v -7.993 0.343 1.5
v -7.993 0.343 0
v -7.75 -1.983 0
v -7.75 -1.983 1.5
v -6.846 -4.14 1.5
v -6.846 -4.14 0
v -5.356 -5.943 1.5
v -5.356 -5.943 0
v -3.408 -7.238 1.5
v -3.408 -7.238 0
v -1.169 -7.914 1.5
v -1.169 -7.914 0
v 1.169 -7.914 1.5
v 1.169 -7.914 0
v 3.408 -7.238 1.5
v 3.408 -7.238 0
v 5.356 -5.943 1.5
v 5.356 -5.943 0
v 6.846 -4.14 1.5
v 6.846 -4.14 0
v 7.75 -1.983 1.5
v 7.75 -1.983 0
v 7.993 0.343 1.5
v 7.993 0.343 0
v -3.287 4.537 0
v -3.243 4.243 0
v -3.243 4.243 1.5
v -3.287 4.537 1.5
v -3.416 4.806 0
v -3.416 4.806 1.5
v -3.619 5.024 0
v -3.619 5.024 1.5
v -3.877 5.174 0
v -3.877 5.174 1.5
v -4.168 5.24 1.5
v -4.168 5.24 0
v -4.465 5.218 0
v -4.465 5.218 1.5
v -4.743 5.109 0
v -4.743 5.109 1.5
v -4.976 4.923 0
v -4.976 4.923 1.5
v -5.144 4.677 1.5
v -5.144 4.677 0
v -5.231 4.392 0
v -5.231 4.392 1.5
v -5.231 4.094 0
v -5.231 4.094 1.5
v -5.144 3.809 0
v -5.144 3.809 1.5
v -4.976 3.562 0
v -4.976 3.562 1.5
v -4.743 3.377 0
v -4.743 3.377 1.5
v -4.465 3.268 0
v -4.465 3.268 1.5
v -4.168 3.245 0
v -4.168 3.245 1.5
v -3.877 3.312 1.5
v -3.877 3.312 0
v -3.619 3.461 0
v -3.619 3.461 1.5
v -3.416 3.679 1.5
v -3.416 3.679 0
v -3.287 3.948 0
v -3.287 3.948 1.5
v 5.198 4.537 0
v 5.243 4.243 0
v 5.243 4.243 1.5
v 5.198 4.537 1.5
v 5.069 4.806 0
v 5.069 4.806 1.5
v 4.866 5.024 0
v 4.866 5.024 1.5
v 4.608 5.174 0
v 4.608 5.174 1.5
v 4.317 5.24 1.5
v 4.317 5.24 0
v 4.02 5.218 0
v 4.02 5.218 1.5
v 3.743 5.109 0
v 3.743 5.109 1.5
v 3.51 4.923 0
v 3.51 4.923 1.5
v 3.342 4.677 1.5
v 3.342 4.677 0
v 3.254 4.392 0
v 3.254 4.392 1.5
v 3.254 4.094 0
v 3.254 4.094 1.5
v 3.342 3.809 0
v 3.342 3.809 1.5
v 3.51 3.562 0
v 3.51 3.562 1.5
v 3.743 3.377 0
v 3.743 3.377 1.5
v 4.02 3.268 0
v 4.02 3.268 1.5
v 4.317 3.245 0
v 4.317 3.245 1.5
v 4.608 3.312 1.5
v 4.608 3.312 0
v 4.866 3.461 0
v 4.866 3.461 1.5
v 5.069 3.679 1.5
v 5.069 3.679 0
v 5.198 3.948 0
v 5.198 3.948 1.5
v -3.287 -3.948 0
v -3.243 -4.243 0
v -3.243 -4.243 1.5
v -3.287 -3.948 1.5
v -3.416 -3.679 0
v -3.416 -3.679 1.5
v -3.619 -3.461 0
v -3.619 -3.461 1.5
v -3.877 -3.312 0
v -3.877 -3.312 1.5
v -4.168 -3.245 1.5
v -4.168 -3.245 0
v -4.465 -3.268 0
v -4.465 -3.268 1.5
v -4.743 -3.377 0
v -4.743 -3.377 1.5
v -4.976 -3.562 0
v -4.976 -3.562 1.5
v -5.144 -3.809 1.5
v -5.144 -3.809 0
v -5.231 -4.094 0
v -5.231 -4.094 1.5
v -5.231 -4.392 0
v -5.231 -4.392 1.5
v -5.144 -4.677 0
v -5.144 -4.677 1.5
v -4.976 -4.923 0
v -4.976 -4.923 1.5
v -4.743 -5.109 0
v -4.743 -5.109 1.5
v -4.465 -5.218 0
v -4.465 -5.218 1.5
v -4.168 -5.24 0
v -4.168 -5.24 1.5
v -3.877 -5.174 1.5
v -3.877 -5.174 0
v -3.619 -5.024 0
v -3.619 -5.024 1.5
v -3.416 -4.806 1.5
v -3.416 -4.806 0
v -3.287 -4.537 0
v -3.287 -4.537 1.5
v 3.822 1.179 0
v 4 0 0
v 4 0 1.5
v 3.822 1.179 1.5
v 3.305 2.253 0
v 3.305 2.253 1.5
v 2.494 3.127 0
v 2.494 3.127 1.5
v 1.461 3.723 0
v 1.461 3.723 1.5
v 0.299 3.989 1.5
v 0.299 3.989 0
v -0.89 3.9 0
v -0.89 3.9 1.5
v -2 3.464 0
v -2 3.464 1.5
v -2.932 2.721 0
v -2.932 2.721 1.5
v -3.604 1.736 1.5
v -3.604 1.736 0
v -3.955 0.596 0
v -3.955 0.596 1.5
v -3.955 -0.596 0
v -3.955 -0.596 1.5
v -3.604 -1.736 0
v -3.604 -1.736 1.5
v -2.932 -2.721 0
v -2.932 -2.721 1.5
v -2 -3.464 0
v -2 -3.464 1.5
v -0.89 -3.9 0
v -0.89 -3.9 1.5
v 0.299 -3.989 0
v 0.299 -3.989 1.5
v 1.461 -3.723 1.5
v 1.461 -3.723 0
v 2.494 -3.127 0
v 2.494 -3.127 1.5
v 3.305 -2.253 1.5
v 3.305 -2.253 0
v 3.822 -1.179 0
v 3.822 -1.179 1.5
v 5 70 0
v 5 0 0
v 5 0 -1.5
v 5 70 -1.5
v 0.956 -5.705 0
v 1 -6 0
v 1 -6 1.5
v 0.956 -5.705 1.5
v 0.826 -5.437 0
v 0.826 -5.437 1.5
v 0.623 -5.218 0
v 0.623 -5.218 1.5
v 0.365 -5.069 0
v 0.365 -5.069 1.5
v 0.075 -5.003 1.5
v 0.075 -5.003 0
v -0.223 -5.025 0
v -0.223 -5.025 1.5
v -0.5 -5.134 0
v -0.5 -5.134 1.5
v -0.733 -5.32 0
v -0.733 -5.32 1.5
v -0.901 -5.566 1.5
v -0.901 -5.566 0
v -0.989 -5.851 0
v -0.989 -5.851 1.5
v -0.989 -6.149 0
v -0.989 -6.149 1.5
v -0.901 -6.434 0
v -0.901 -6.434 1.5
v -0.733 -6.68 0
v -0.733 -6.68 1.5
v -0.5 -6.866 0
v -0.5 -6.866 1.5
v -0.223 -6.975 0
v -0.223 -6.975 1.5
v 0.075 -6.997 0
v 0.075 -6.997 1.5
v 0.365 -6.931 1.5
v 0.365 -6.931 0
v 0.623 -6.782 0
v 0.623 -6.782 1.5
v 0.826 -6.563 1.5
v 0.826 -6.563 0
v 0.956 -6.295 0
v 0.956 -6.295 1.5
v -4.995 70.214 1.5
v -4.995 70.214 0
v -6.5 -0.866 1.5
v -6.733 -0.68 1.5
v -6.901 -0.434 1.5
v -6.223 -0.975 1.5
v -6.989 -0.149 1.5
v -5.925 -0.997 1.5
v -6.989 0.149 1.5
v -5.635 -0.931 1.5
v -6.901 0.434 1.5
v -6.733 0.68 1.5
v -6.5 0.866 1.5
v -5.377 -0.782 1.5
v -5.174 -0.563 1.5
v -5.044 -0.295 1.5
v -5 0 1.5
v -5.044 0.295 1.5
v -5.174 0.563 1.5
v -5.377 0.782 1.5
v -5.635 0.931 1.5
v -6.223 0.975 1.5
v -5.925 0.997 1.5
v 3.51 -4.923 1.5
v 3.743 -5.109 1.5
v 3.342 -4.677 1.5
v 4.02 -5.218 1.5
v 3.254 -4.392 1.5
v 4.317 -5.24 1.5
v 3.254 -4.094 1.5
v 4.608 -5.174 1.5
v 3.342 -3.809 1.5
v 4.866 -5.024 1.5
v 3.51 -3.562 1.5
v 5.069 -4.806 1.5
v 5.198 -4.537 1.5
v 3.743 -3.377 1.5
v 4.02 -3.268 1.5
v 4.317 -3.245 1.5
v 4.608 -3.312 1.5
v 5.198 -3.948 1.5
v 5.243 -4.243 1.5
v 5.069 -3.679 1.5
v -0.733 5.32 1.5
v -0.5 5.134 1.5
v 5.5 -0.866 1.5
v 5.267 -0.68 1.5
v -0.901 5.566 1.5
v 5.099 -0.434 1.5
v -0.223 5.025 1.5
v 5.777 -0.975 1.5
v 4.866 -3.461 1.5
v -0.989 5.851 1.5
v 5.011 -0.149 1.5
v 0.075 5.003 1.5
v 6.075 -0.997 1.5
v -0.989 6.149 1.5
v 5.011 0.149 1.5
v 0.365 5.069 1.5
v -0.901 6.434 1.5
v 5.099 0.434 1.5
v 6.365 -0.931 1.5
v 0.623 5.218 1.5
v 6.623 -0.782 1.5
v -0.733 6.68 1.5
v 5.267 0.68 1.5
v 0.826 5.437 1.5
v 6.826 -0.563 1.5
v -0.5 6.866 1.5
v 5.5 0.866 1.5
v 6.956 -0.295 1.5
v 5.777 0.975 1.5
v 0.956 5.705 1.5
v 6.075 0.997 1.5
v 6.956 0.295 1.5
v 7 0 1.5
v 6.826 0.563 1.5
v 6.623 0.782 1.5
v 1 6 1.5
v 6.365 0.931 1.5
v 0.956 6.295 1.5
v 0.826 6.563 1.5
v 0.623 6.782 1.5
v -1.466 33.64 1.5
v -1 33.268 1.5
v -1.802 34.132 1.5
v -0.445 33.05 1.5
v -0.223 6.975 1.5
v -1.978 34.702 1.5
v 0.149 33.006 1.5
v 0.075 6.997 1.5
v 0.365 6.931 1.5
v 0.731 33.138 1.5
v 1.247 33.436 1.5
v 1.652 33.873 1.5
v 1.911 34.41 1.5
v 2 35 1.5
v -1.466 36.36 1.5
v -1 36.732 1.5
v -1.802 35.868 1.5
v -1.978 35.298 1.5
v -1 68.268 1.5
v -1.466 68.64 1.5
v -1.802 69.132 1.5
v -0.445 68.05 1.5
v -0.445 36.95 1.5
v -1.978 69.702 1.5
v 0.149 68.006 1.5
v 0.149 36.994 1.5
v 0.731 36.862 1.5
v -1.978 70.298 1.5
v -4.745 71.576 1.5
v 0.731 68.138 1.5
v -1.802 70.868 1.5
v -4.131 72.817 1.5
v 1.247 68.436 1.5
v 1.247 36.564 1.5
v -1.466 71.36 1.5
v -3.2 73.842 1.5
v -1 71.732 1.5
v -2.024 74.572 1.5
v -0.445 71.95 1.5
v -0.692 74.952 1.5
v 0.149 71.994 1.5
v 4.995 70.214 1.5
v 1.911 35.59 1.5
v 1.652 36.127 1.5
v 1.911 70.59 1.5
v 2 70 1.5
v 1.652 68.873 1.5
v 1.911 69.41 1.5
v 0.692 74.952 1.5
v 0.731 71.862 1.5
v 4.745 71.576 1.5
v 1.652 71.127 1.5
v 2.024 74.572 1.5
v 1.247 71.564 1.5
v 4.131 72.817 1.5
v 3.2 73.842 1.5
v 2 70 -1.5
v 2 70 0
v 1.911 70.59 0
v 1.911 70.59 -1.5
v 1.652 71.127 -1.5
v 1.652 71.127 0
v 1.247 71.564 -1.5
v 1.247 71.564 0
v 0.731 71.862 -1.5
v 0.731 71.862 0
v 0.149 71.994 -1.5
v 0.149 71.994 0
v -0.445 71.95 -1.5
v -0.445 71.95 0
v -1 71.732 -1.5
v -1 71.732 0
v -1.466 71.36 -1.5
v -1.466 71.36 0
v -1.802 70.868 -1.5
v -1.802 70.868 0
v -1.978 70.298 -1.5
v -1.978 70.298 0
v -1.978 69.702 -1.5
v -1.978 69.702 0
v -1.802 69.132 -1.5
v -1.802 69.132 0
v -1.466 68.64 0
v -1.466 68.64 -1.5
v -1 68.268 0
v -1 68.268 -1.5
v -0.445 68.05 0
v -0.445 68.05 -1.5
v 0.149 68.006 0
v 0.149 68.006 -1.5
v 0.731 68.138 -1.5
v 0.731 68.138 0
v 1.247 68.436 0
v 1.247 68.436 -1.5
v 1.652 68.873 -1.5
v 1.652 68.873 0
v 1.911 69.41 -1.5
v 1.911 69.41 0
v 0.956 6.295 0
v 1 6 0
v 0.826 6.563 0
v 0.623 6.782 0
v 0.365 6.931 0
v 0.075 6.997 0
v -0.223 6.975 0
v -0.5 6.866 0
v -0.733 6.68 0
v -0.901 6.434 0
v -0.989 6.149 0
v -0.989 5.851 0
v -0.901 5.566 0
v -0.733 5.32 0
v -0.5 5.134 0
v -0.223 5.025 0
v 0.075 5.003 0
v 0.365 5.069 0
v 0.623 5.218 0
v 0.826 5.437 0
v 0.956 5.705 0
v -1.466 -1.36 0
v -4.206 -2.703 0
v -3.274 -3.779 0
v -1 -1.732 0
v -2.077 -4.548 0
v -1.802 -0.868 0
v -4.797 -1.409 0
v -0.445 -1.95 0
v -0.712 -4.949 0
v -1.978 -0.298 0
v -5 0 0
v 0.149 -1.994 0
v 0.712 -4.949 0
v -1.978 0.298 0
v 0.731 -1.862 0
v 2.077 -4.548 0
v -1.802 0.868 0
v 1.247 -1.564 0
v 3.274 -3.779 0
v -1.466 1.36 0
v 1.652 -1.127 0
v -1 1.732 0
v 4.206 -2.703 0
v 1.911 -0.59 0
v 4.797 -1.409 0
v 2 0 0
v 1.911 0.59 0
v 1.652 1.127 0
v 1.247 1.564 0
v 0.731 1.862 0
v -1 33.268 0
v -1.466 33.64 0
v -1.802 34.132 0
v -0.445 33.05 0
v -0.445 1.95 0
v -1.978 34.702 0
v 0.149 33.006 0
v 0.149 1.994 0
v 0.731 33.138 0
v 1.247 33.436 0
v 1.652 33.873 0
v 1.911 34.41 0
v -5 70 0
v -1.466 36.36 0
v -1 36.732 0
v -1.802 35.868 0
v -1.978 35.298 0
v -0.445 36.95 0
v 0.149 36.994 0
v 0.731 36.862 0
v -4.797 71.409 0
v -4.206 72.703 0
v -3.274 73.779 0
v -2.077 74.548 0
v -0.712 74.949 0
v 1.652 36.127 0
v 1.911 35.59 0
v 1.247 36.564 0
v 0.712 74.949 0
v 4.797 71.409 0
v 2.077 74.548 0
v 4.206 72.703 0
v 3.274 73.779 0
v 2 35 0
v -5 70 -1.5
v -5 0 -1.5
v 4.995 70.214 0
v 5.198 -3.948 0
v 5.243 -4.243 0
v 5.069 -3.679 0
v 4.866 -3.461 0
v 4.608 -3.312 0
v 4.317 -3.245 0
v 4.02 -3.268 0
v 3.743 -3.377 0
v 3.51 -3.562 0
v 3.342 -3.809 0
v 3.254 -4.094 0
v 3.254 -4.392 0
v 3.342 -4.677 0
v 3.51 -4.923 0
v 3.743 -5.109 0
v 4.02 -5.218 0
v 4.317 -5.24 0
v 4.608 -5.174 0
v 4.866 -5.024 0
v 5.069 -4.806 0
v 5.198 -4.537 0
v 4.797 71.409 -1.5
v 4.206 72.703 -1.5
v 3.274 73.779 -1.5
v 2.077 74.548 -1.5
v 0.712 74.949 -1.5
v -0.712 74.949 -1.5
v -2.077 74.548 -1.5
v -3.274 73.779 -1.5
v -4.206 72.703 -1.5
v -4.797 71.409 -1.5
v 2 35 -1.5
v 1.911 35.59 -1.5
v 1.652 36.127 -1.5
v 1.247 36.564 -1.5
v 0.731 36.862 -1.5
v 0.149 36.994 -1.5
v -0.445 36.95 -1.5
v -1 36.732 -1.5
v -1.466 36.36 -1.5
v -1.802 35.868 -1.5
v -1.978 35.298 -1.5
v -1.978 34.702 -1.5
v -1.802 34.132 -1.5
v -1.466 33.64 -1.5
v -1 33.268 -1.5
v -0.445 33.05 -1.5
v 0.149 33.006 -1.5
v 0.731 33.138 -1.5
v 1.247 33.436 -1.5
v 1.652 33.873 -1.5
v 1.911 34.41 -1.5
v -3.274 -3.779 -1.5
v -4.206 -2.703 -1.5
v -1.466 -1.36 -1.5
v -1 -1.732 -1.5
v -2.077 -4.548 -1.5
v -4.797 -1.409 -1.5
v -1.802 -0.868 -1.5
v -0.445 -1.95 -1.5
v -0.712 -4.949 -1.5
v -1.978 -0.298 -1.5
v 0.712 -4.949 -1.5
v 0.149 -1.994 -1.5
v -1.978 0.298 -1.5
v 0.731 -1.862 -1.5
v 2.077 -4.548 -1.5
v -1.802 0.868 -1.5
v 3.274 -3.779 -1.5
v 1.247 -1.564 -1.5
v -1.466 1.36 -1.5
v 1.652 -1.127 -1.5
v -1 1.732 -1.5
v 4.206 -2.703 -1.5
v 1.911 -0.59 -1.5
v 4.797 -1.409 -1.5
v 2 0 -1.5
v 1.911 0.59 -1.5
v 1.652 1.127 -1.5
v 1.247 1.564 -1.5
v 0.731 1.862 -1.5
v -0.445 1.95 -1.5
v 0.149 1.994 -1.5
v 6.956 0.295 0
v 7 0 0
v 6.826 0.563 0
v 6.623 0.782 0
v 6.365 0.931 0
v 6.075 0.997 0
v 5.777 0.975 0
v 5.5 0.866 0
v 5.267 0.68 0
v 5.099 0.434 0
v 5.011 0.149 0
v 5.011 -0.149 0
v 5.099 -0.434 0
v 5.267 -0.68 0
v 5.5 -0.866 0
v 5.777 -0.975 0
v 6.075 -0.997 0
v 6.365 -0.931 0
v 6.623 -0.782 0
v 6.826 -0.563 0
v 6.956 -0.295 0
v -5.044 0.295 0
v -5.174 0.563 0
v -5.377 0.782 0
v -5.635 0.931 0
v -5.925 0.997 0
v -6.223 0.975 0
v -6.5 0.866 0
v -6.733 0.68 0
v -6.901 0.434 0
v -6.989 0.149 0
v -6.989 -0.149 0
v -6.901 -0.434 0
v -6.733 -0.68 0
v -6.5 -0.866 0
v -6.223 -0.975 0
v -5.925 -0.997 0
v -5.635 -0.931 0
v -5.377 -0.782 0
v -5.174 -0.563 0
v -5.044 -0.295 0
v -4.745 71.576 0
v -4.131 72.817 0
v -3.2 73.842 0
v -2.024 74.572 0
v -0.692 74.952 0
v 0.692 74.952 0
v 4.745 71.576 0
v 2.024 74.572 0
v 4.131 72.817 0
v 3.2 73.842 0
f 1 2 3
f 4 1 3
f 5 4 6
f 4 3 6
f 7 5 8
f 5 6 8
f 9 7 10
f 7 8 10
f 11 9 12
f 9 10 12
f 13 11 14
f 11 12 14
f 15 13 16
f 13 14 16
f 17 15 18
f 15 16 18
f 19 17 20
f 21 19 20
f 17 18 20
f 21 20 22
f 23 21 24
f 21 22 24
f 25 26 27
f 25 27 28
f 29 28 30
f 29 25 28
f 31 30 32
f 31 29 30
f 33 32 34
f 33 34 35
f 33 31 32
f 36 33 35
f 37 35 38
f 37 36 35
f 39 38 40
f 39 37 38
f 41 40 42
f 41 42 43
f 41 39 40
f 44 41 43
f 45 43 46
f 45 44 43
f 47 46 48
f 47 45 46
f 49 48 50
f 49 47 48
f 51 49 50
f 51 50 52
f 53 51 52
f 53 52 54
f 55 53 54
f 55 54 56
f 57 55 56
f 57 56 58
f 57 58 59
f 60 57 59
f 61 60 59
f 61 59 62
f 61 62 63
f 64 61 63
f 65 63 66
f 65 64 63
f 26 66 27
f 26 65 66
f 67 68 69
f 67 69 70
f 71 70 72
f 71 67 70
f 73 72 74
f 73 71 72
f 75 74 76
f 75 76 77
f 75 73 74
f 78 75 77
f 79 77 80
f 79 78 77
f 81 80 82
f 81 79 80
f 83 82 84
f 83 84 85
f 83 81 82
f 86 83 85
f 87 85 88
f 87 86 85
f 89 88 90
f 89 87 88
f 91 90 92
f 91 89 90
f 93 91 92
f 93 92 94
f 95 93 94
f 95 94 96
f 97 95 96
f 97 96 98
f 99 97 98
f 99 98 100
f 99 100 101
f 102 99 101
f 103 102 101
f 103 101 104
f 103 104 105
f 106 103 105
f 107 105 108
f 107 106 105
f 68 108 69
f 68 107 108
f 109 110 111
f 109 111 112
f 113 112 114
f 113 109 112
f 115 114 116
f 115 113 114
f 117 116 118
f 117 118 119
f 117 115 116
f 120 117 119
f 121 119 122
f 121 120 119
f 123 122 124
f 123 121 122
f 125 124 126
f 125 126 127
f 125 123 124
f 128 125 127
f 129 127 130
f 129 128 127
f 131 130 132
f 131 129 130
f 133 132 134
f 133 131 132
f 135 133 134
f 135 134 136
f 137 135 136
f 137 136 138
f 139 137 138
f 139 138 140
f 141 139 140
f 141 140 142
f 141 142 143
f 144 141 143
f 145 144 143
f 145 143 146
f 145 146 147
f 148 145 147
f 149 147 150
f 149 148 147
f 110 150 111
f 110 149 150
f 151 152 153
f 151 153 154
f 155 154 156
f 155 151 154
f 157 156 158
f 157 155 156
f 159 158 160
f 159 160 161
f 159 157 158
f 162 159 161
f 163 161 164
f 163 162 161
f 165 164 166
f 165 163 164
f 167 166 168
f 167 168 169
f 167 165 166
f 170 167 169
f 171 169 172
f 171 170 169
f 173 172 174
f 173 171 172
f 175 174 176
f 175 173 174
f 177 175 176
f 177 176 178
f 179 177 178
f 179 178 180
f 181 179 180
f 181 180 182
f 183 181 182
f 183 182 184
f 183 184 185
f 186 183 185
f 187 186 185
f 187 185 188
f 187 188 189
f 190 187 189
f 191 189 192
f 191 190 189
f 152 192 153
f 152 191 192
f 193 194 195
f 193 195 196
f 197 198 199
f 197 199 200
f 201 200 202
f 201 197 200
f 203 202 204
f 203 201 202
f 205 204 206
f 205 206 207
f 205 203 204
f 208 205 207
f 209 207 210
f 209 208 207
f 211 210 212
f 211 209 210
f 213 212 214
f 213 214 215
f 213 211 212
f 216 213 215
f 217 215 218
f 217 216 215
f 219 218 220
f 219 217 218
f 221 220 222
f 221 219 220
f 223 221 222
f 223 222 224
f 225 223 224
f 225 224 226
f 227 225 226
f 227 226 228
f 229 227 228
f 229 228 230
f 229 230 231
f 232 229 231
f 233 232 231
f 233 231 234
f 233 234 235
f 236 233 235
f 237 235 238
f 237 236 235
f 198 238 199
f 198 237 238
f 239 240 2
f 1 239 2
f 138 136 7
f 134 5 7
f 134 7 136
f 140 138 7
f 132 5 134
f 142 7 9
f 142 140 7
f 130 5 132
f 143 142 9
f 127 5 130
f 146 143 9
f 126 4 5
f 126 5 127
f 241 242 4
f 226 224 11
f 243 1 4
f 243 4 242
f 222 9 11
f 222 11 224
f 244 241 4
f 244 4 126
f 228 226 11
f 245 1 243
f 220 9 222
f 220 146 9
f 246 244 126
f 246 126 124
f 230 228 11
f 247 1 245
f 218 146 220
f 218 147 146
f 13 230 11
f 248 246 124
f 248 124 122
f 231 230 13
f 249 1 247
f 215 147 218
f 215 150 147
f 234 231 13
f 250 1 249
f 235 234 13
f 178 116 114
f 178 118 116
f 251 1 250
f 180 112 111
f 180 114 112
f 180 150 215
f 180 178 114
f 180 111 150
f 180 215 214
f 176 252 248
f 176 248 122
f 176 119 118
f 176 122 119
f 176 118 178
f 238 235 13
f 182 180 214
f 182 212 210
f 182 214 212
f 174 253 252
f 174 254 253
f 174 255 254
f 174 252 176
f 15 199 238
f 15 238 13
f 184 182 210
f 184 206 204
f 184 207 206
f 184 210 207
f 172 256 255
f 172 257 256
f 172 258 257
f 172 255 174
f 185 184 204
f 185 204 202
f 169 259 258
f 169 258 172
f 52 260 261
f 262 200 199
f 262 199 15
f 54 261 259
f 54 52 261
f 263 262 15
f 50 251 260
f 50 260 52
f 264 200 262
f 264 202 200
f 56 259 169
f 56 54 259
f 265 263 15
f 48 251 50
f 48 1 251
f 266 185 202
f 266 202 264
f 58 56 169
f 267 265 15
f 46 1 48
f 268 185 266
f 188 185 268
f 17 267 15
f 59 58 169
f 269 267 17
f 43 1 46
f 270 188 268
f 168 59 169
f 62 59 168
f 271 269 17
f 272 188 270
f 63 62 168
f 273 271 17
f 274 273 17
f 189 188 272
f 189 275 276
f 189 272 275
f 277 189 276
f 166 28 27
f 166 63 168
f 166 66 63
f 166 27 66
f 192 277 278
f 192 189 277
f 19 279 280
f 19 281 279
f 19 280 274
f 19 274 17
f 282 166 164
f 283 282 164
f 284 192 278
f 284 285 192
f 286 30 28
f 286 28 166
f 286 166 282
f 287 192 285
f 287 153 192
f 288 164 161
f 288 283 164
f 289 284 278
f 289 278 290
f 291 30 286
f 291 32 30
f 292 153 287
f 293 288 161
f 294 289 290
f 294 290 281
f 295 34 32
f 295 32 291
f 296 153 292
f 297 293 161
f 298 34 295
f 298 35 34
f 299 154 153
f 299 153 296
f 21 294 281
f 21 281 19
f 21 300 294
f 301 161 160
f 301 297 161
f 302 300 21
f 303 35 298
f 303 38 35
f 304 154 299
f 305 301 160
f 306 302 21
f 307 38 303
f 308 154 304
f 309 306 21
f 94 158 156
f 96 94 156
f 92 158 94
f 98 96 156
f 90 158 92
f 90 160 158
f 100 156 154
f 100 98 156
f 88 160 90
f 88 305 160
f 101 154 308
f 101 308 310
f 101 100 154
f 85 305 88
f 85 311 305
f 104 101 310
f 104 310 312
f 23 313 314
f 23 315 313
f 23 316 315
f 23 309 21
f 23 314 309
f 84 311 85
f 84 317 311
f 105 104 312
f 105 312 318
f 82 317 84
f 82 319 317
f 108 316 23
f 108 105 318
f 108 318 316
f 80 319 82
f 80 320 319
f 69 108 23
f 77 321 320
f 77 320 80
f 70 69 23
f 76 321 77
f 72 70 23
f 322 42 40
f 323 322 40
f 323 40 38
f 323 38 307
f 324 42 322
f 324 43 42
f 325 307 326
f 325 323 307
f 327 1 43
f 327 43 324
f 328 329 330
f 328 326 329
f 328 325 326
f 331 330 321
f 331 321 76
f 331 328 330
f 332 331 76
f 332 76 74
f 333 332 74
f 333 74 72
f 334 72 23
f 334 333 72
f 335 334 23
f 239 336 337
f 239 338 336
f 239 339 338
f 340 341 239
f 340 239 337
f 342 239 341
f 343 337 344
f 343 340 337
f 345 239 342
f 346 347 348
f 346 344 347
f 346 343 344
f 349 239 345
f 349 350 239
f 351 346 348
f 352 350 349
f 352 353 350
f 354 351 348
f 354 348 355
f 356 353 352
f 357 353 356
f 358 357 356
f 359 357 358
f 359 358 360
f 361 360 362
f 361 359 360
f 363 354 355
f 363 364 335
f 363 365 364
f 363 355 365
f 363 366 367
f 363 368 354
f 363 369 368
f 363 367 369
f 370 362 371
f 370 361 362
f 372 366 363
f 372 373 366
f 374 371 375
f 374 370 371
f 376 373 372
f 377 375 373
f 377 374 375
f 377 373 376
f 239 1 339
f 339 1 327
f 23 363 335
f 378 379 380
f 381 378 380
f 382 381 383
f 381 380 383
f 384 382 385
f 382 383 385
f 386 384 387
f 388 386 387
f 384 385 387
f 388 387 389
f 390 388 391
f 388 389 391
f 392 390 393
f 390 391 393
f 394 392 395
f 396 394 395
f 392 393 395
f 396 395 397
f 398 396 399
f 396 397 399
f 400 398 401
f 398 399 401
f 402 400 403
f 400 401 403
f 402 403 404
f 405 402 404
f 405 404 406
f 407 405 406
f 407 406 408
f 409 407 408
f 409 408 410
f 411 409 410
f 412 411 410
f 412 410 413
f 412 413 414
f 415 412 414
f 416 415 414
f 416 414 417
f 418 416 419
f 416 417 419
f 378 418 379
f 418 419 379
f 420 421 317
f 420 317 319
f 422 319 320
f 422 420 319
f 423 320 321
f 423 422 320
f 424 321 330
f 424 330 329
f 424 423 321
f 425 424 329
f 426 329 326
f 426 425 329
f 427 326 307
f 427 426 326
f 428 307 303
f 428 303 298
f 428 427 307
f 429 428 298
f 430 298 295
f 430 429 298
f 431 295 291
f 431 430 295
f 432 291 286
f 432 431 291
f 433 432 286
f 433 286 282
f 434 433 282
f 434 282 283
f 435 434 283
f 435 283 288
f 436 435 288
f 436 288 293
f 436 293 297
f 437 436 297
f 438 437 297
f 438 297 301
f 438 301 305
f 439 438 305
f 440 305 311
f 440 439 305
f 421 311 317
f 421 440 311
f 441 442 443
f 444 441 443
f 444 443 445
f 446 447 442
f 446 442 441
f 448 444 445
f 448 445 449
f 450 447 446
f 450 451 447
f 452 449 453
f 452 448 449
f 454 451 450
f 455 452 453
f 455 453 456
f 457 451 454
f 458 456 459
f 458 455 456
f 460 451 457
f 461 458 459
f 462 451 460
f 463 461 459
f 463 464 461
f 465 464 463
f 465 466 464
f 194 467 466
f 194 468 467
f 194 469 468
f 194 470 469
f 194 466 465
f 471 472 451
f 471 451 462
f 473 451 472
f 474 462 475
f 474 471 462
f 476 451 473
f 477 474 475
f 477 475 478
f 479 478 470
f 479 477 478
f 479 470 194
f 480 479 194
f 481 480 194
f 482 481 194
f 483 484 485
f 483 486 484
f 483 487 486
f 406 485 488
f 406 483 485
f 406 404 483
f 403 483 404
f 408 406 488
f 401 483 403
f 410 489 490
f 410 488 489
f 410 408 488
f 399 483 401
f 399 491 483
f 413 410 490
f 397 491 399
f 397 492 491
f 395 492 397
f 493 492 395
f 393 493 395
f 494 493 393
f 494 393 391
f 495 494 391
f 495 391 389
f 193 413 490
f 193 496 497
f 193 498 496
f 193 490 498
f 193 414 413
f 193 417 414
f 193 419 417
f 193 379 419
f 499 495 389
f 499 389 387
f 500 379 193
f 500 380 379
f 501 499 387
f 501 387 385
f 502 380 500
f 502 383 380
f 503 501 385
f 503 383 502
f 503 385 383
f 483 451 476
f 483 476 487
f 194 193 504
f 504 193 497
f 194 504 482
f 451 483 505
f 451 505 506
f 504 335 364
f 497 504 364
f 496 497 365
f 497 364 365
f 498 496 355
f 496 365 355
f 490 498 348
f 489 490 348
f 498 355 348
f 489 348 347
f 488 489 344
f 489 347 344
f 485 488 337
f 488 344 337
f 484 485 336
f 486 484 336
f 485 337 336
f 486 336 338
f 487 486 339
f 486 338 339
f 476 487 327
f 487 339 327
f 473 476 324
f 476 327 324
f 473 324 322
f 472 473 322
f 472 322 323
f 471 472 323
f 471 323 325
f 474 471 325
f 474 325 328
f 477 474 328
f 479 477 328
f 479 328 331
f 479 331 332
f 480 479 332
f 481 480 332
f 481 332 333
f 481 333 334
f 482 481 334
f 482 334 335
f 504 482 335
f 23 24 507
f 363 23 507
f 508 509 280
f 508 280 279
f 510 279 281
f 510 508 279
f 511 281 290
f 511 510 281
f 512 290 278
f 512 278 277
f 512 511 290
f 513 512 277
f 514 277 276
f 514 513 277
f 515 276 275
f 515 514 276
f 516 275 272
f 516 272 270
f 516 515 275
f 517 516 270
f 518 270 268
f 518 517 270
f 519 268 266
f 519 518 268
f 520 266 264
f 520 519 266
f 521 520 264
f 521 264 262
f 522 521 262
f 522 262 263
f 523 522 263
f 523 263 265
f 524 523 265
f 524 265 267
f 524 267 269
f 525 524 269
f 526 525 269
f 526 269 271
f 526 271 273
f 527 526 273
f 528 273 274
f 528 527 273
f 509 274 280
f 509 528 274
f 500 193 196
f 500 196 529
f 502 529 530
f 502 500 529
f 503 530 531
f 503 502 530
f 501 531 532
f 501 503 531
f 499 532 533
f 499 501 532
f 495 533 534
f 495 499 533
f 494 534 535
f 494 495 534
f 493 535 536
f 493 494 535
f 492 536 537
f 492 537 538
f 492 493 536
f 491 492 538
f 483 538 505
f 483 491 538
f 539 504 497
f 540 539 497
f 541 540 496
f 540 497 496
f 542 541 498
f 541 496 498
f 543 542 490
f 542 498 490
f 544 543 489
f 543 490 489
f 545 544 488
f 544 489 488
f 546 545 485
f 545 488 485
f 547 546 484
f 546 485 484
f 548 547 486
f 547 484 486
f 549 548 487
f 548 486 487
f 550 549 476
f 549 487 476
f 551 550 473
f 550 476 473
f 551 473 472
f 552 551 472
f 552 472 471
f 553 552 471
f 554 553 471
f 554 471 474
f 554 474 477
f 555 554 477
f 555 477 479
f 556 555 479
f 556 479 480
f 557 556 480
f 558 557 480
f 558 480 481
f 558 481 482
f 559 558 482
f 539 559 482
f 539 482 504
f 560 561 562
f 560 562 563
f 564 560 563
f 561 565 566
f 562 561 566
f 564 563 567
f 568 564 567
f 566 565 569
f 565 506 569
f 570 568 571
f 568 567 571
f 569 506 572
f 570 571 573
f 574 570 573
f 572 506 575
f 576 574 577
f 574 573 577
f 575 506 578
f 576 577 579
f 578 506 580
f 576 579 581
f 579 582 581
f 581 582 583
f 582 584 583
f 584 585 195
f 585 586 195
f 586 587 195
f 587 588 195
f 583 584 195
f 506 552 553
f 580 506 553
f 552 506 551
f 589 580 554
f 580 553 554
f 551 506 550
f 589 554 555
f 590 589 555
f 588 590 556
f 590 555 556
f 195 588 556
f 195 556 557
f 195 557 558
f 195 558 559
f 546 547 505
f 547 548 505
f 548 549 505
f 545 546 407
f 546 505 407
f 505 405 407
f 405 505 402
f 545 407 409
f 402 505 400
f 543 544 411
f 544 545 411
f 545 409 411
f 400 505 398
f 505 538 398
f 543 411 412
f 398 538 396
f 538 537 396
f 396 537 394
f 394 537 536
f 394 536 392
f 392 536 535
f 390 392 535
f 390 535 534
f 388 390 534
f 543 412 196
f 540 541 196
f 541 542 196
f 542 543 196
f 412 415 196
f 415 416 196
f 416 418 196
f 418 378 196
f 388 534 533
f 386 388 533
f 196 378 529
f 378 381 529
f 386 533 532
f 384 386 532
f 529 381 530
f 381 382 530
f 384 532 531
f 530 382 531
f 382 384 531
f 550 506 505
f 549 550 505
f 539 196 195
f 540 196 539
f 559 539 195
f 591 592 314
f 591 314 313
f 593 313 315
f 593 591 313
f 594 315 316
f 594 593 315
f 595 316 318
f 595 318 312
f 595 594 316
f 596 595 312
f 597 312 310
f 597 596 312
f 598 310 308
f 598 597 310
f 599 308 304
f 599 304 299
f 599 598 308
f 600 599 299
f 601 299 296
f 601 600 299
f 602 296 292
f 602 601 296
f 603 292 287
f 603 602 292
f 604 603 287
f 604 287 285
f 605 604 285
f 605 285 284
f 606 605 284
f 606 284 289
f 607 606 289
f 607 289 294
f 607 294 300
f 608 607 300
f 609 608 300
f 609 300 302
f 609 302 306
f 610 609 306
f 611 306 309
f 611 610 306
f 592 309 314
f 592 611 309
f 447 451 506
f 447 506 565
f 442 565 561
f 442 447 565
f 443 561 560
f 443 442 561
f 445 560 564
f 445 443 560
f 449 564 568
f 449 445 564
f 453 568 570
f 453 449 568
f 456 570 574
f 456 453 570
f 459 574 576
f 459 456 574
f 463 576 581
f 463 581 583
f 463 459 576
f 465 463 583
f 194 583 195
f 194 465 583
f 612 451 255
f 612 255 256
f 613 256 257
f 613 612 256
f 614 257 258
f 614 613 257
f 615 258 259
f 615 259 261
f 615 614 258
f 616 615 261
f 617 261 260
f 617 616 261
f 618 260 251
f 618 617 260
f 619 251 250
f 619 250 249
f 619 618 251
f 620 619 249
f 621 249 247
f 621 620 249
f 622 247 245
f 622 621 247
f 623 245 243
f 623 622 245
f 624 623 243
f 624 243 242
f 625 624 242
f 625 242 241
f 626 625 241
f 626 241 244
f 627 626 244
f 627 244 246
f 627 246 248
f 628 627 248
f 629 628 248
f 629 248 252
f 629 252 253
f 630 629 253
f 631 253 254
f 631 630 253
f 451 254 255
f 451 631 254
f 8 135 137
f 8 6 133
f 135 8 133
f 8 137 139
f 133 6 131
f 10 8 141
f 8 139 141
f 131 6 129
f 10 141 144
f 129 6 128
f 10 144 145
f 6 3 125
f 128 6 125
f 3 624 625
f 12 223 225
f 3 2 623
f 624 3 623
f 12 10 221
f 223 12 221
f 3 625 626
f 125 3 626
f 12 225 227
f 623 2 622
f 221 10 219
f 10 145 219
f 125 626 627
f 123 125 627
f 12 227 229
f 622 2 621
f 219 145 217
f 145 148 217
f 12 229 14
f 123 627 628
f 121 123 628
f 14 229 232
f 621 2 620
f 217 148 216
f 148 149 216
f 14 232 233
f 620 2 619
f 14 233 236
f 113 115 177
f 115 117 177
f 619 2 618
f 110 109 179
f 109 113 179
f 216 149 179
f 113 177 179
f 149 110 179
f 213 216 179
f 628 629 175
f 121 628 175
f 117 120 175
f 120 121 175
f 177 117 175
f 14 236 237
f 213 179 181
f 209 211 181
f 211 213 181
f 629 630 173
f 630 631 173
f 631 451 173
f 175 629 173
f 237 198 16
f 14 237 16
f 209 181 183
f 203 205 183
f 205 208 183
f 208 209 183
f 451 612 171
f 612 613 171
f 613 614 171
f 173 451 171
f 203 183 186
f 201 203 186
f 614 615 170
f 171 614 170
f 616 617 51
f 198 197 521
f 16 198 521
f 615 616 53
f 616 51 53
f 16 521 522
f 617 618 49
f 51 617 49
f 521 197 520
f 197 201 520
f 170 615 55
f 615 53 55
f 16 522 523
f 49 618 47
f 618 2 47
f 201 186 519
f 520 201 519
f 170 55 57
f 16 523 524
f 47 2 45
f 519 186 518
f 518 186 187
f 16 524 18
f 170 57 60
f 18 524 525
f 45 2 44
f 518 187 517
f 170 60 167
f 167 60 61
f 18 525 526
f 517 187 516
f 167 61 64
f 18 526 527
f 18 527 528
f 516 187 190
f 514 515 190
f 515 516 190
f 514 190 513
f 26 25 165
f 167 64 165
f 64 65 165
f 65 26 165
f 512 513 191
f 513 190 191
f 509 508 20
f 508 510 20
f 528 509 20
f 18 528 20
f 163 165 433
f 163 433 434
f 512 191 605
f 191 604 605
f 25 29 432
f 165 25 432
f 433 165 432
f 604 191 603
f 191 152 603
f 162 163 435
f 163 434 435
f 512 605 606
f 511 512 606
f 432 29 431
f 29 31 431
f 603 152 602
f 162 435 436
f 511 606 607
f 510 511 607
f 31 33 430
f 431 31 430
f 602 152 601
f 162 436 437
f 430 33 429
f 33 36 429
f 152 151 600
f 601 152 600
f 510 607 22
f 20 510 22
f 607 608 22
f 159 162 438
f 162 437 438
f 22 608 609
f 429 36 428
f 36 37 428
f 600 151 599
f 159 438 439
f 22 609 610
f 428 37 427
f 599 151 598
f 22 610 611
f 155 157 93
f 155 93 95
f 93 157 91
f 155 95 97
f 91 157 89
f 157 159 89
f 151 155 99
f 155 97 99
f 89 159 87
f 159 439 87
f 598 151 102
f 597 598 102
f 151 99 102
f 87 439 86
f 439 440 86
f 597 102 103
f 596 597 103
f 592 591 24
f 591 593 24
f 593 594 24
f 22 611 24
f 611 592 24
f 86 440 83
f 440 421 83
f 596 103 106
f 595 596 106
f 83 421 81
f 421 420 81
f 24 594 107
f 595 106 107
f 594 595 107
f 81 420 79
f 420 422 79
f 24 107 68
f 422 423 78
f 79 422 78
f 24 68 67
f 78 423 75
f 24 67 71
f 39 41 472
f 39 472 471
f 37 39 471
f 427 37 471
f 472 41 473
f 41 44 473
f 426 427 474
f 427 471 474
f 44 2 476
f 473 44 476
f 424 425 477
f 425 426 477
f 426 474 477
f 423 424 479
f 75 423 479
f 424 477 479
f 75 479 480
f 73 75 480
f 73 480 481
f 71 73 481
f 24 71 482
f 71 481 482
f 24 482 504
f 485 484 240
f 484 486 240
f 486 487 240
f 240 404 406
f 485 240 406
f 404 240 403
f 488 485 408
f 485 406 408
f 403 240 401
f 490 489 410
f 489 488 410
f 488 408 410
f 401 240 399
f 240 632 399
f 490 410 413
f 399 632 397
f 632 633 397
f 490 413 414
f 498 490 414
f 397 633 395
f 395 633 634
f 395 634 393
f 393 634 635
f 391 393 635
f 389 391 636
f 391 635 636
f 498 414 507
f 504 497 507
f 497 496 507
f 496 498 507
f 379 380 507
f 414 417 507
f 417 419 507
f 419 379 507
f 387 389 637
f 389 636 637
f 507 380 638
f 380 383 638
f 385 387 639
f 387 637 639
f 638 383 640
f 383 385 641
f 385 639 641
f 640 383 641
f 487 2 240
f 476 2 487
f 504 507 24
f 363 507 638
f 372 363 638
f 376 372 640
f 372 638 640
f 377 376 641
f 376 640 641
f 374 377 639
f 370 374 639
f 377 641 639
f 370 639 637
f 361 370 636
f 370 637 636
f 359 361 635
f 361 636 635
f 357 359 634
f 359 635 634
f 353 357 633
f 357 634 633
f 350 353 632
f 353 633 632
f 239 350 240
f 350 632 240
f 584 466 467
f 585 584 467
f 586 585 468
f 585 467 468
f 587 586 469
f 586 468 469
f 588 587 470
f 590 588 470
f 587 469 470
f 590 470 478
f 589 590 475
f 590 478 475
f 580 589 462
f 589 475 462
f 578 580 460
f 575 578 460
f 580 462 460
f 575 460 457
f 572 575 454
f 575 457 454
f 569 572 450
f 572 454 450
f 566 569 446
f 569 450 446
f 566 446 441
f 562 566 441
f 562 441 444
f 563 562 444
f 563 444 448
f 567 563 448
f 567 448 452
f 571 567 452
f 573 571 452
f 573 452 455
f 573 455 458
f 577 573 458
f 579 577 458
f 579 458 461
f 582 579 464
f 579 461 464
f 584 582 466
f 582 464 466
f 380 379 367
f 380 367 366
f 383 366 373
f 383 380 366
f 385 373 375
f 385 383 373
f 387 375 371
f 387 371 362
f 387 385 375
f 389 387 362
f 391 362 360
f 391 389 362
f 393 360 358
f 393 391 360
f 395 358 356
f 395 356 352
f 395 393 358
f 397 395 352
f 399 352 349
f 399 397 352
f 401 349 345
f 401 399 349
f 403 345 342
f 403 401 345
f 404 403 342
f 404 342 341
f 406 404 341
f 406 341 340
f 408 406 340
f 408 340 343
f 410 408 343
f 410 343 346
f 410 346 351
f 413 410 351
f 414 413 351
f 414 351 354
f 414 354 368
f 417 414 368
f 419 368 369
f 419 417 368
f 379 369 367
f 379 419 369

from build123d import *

# Parameters (mm, degrees)
F0_R     = 1
F0_R_2   = 4
F0_R_3   = 2
F1_DEPTH = 1.5
F2_R     = 2
F3_DEPTH = 1.5
F4_R     = 2
F5_DEPTH = 3.001


with BuildPart() as f1:
    # F0 (on Top) → F1 (new body)
    with BuildSketch(Plane.XY):
        with BuildLine():
            Line((-4.995406, 70.214286), (-7.99265, 0.342857))
            ThreePointArc((-7.99265, 0.342857), (0, -8), (7.99265, 0.342857))
            Line((7.99265, 0.342857), (4.995406, 70.214286))
            ThreePointArc((4.995406, 70.214286), (0, 75), (-4.995406, 70.214286))
        make_face()
        with Locations((-4.242641, -4.242641)):
            Circle(F0_R, mode=Mode.SUBTRACT)
        with Locations((-6, 0)):
            Circle(F0_R, mode=Mode.SUBTRACT)
        with Locations((-4.242641, 4.242641)):
            Circle(F0_R, mode=Mode.SUBTRACT)
        with Locations((0, -6)):
            Circle(F0_R, mode=Mode.SUBTRACT)
        Circle(F0_R_2, mode=Mode.SUBTRACT)
        with Locations((0, 6)):
            Circle(F0_R, mode=Mode.SUBTRACT)
        with Locations((4.242641, -4.242641)):
            Circle(F0_R, mode=Mode.SUBTRACT)
        with Locations((6, 0)):
            Circle(F0_R, mode=Mode.SUBTRACT)
        with Locations((4.242641, 4.242641)):
            Circle(F0_R, mode=Mode.SUBTRACT)
        with Locations((0, 70)):
            Circle(F0_R_3, mode=Mode.SUBTRACT)
    extrude(amount=F1_DEPTH)


with BuildPart() as f3:
    # F2 (on Top) → F3 (new body)
    with BuildSketch(Plane.XY):
        with BuildLine():
            Line((5, 35), (5, 70))
            ThreePointArc((5, 70), (0, 75), (-5, 70))
            Line((-5, 70), (-5, 35))
            Line((-5, 35), (-5, 0))
            ThreePointArc((-5, 0), (0, -5), (5, 0))
            Line((5, 0), (5, 35))
        make_face()
        Circle(F2_R, mode=Mode.SUBTRACT)
        with Locations((0, 70)):
            Circle(F2_R, mode=Mode.SUBTRACT)
    extrude(amount=-F3_DEPTH)


with BuildPart() as f5_tool:
    # F4 (on face) → F5 (new body, through all)
    with BuildSketch(Plane.XY.offset(1.5)):
        with Locations((0, 35)):
            Circle(F4_R)
    extrude(amount=-F5_DEPTH)


with BuildPart() as f1_1:
    add(f1.part)

    # F5: cut by f5_tool
    add(f5_tool.part, mode=Mode.SUBTRACT)


with BuildPart() as f3_1:
    add(f3.part)

    # F5: cut by f5_tool
    add(f5_tool.part, mode=Mode.SUBTRACT)


solid = Compound([f1_1.part, f3_1.part])
